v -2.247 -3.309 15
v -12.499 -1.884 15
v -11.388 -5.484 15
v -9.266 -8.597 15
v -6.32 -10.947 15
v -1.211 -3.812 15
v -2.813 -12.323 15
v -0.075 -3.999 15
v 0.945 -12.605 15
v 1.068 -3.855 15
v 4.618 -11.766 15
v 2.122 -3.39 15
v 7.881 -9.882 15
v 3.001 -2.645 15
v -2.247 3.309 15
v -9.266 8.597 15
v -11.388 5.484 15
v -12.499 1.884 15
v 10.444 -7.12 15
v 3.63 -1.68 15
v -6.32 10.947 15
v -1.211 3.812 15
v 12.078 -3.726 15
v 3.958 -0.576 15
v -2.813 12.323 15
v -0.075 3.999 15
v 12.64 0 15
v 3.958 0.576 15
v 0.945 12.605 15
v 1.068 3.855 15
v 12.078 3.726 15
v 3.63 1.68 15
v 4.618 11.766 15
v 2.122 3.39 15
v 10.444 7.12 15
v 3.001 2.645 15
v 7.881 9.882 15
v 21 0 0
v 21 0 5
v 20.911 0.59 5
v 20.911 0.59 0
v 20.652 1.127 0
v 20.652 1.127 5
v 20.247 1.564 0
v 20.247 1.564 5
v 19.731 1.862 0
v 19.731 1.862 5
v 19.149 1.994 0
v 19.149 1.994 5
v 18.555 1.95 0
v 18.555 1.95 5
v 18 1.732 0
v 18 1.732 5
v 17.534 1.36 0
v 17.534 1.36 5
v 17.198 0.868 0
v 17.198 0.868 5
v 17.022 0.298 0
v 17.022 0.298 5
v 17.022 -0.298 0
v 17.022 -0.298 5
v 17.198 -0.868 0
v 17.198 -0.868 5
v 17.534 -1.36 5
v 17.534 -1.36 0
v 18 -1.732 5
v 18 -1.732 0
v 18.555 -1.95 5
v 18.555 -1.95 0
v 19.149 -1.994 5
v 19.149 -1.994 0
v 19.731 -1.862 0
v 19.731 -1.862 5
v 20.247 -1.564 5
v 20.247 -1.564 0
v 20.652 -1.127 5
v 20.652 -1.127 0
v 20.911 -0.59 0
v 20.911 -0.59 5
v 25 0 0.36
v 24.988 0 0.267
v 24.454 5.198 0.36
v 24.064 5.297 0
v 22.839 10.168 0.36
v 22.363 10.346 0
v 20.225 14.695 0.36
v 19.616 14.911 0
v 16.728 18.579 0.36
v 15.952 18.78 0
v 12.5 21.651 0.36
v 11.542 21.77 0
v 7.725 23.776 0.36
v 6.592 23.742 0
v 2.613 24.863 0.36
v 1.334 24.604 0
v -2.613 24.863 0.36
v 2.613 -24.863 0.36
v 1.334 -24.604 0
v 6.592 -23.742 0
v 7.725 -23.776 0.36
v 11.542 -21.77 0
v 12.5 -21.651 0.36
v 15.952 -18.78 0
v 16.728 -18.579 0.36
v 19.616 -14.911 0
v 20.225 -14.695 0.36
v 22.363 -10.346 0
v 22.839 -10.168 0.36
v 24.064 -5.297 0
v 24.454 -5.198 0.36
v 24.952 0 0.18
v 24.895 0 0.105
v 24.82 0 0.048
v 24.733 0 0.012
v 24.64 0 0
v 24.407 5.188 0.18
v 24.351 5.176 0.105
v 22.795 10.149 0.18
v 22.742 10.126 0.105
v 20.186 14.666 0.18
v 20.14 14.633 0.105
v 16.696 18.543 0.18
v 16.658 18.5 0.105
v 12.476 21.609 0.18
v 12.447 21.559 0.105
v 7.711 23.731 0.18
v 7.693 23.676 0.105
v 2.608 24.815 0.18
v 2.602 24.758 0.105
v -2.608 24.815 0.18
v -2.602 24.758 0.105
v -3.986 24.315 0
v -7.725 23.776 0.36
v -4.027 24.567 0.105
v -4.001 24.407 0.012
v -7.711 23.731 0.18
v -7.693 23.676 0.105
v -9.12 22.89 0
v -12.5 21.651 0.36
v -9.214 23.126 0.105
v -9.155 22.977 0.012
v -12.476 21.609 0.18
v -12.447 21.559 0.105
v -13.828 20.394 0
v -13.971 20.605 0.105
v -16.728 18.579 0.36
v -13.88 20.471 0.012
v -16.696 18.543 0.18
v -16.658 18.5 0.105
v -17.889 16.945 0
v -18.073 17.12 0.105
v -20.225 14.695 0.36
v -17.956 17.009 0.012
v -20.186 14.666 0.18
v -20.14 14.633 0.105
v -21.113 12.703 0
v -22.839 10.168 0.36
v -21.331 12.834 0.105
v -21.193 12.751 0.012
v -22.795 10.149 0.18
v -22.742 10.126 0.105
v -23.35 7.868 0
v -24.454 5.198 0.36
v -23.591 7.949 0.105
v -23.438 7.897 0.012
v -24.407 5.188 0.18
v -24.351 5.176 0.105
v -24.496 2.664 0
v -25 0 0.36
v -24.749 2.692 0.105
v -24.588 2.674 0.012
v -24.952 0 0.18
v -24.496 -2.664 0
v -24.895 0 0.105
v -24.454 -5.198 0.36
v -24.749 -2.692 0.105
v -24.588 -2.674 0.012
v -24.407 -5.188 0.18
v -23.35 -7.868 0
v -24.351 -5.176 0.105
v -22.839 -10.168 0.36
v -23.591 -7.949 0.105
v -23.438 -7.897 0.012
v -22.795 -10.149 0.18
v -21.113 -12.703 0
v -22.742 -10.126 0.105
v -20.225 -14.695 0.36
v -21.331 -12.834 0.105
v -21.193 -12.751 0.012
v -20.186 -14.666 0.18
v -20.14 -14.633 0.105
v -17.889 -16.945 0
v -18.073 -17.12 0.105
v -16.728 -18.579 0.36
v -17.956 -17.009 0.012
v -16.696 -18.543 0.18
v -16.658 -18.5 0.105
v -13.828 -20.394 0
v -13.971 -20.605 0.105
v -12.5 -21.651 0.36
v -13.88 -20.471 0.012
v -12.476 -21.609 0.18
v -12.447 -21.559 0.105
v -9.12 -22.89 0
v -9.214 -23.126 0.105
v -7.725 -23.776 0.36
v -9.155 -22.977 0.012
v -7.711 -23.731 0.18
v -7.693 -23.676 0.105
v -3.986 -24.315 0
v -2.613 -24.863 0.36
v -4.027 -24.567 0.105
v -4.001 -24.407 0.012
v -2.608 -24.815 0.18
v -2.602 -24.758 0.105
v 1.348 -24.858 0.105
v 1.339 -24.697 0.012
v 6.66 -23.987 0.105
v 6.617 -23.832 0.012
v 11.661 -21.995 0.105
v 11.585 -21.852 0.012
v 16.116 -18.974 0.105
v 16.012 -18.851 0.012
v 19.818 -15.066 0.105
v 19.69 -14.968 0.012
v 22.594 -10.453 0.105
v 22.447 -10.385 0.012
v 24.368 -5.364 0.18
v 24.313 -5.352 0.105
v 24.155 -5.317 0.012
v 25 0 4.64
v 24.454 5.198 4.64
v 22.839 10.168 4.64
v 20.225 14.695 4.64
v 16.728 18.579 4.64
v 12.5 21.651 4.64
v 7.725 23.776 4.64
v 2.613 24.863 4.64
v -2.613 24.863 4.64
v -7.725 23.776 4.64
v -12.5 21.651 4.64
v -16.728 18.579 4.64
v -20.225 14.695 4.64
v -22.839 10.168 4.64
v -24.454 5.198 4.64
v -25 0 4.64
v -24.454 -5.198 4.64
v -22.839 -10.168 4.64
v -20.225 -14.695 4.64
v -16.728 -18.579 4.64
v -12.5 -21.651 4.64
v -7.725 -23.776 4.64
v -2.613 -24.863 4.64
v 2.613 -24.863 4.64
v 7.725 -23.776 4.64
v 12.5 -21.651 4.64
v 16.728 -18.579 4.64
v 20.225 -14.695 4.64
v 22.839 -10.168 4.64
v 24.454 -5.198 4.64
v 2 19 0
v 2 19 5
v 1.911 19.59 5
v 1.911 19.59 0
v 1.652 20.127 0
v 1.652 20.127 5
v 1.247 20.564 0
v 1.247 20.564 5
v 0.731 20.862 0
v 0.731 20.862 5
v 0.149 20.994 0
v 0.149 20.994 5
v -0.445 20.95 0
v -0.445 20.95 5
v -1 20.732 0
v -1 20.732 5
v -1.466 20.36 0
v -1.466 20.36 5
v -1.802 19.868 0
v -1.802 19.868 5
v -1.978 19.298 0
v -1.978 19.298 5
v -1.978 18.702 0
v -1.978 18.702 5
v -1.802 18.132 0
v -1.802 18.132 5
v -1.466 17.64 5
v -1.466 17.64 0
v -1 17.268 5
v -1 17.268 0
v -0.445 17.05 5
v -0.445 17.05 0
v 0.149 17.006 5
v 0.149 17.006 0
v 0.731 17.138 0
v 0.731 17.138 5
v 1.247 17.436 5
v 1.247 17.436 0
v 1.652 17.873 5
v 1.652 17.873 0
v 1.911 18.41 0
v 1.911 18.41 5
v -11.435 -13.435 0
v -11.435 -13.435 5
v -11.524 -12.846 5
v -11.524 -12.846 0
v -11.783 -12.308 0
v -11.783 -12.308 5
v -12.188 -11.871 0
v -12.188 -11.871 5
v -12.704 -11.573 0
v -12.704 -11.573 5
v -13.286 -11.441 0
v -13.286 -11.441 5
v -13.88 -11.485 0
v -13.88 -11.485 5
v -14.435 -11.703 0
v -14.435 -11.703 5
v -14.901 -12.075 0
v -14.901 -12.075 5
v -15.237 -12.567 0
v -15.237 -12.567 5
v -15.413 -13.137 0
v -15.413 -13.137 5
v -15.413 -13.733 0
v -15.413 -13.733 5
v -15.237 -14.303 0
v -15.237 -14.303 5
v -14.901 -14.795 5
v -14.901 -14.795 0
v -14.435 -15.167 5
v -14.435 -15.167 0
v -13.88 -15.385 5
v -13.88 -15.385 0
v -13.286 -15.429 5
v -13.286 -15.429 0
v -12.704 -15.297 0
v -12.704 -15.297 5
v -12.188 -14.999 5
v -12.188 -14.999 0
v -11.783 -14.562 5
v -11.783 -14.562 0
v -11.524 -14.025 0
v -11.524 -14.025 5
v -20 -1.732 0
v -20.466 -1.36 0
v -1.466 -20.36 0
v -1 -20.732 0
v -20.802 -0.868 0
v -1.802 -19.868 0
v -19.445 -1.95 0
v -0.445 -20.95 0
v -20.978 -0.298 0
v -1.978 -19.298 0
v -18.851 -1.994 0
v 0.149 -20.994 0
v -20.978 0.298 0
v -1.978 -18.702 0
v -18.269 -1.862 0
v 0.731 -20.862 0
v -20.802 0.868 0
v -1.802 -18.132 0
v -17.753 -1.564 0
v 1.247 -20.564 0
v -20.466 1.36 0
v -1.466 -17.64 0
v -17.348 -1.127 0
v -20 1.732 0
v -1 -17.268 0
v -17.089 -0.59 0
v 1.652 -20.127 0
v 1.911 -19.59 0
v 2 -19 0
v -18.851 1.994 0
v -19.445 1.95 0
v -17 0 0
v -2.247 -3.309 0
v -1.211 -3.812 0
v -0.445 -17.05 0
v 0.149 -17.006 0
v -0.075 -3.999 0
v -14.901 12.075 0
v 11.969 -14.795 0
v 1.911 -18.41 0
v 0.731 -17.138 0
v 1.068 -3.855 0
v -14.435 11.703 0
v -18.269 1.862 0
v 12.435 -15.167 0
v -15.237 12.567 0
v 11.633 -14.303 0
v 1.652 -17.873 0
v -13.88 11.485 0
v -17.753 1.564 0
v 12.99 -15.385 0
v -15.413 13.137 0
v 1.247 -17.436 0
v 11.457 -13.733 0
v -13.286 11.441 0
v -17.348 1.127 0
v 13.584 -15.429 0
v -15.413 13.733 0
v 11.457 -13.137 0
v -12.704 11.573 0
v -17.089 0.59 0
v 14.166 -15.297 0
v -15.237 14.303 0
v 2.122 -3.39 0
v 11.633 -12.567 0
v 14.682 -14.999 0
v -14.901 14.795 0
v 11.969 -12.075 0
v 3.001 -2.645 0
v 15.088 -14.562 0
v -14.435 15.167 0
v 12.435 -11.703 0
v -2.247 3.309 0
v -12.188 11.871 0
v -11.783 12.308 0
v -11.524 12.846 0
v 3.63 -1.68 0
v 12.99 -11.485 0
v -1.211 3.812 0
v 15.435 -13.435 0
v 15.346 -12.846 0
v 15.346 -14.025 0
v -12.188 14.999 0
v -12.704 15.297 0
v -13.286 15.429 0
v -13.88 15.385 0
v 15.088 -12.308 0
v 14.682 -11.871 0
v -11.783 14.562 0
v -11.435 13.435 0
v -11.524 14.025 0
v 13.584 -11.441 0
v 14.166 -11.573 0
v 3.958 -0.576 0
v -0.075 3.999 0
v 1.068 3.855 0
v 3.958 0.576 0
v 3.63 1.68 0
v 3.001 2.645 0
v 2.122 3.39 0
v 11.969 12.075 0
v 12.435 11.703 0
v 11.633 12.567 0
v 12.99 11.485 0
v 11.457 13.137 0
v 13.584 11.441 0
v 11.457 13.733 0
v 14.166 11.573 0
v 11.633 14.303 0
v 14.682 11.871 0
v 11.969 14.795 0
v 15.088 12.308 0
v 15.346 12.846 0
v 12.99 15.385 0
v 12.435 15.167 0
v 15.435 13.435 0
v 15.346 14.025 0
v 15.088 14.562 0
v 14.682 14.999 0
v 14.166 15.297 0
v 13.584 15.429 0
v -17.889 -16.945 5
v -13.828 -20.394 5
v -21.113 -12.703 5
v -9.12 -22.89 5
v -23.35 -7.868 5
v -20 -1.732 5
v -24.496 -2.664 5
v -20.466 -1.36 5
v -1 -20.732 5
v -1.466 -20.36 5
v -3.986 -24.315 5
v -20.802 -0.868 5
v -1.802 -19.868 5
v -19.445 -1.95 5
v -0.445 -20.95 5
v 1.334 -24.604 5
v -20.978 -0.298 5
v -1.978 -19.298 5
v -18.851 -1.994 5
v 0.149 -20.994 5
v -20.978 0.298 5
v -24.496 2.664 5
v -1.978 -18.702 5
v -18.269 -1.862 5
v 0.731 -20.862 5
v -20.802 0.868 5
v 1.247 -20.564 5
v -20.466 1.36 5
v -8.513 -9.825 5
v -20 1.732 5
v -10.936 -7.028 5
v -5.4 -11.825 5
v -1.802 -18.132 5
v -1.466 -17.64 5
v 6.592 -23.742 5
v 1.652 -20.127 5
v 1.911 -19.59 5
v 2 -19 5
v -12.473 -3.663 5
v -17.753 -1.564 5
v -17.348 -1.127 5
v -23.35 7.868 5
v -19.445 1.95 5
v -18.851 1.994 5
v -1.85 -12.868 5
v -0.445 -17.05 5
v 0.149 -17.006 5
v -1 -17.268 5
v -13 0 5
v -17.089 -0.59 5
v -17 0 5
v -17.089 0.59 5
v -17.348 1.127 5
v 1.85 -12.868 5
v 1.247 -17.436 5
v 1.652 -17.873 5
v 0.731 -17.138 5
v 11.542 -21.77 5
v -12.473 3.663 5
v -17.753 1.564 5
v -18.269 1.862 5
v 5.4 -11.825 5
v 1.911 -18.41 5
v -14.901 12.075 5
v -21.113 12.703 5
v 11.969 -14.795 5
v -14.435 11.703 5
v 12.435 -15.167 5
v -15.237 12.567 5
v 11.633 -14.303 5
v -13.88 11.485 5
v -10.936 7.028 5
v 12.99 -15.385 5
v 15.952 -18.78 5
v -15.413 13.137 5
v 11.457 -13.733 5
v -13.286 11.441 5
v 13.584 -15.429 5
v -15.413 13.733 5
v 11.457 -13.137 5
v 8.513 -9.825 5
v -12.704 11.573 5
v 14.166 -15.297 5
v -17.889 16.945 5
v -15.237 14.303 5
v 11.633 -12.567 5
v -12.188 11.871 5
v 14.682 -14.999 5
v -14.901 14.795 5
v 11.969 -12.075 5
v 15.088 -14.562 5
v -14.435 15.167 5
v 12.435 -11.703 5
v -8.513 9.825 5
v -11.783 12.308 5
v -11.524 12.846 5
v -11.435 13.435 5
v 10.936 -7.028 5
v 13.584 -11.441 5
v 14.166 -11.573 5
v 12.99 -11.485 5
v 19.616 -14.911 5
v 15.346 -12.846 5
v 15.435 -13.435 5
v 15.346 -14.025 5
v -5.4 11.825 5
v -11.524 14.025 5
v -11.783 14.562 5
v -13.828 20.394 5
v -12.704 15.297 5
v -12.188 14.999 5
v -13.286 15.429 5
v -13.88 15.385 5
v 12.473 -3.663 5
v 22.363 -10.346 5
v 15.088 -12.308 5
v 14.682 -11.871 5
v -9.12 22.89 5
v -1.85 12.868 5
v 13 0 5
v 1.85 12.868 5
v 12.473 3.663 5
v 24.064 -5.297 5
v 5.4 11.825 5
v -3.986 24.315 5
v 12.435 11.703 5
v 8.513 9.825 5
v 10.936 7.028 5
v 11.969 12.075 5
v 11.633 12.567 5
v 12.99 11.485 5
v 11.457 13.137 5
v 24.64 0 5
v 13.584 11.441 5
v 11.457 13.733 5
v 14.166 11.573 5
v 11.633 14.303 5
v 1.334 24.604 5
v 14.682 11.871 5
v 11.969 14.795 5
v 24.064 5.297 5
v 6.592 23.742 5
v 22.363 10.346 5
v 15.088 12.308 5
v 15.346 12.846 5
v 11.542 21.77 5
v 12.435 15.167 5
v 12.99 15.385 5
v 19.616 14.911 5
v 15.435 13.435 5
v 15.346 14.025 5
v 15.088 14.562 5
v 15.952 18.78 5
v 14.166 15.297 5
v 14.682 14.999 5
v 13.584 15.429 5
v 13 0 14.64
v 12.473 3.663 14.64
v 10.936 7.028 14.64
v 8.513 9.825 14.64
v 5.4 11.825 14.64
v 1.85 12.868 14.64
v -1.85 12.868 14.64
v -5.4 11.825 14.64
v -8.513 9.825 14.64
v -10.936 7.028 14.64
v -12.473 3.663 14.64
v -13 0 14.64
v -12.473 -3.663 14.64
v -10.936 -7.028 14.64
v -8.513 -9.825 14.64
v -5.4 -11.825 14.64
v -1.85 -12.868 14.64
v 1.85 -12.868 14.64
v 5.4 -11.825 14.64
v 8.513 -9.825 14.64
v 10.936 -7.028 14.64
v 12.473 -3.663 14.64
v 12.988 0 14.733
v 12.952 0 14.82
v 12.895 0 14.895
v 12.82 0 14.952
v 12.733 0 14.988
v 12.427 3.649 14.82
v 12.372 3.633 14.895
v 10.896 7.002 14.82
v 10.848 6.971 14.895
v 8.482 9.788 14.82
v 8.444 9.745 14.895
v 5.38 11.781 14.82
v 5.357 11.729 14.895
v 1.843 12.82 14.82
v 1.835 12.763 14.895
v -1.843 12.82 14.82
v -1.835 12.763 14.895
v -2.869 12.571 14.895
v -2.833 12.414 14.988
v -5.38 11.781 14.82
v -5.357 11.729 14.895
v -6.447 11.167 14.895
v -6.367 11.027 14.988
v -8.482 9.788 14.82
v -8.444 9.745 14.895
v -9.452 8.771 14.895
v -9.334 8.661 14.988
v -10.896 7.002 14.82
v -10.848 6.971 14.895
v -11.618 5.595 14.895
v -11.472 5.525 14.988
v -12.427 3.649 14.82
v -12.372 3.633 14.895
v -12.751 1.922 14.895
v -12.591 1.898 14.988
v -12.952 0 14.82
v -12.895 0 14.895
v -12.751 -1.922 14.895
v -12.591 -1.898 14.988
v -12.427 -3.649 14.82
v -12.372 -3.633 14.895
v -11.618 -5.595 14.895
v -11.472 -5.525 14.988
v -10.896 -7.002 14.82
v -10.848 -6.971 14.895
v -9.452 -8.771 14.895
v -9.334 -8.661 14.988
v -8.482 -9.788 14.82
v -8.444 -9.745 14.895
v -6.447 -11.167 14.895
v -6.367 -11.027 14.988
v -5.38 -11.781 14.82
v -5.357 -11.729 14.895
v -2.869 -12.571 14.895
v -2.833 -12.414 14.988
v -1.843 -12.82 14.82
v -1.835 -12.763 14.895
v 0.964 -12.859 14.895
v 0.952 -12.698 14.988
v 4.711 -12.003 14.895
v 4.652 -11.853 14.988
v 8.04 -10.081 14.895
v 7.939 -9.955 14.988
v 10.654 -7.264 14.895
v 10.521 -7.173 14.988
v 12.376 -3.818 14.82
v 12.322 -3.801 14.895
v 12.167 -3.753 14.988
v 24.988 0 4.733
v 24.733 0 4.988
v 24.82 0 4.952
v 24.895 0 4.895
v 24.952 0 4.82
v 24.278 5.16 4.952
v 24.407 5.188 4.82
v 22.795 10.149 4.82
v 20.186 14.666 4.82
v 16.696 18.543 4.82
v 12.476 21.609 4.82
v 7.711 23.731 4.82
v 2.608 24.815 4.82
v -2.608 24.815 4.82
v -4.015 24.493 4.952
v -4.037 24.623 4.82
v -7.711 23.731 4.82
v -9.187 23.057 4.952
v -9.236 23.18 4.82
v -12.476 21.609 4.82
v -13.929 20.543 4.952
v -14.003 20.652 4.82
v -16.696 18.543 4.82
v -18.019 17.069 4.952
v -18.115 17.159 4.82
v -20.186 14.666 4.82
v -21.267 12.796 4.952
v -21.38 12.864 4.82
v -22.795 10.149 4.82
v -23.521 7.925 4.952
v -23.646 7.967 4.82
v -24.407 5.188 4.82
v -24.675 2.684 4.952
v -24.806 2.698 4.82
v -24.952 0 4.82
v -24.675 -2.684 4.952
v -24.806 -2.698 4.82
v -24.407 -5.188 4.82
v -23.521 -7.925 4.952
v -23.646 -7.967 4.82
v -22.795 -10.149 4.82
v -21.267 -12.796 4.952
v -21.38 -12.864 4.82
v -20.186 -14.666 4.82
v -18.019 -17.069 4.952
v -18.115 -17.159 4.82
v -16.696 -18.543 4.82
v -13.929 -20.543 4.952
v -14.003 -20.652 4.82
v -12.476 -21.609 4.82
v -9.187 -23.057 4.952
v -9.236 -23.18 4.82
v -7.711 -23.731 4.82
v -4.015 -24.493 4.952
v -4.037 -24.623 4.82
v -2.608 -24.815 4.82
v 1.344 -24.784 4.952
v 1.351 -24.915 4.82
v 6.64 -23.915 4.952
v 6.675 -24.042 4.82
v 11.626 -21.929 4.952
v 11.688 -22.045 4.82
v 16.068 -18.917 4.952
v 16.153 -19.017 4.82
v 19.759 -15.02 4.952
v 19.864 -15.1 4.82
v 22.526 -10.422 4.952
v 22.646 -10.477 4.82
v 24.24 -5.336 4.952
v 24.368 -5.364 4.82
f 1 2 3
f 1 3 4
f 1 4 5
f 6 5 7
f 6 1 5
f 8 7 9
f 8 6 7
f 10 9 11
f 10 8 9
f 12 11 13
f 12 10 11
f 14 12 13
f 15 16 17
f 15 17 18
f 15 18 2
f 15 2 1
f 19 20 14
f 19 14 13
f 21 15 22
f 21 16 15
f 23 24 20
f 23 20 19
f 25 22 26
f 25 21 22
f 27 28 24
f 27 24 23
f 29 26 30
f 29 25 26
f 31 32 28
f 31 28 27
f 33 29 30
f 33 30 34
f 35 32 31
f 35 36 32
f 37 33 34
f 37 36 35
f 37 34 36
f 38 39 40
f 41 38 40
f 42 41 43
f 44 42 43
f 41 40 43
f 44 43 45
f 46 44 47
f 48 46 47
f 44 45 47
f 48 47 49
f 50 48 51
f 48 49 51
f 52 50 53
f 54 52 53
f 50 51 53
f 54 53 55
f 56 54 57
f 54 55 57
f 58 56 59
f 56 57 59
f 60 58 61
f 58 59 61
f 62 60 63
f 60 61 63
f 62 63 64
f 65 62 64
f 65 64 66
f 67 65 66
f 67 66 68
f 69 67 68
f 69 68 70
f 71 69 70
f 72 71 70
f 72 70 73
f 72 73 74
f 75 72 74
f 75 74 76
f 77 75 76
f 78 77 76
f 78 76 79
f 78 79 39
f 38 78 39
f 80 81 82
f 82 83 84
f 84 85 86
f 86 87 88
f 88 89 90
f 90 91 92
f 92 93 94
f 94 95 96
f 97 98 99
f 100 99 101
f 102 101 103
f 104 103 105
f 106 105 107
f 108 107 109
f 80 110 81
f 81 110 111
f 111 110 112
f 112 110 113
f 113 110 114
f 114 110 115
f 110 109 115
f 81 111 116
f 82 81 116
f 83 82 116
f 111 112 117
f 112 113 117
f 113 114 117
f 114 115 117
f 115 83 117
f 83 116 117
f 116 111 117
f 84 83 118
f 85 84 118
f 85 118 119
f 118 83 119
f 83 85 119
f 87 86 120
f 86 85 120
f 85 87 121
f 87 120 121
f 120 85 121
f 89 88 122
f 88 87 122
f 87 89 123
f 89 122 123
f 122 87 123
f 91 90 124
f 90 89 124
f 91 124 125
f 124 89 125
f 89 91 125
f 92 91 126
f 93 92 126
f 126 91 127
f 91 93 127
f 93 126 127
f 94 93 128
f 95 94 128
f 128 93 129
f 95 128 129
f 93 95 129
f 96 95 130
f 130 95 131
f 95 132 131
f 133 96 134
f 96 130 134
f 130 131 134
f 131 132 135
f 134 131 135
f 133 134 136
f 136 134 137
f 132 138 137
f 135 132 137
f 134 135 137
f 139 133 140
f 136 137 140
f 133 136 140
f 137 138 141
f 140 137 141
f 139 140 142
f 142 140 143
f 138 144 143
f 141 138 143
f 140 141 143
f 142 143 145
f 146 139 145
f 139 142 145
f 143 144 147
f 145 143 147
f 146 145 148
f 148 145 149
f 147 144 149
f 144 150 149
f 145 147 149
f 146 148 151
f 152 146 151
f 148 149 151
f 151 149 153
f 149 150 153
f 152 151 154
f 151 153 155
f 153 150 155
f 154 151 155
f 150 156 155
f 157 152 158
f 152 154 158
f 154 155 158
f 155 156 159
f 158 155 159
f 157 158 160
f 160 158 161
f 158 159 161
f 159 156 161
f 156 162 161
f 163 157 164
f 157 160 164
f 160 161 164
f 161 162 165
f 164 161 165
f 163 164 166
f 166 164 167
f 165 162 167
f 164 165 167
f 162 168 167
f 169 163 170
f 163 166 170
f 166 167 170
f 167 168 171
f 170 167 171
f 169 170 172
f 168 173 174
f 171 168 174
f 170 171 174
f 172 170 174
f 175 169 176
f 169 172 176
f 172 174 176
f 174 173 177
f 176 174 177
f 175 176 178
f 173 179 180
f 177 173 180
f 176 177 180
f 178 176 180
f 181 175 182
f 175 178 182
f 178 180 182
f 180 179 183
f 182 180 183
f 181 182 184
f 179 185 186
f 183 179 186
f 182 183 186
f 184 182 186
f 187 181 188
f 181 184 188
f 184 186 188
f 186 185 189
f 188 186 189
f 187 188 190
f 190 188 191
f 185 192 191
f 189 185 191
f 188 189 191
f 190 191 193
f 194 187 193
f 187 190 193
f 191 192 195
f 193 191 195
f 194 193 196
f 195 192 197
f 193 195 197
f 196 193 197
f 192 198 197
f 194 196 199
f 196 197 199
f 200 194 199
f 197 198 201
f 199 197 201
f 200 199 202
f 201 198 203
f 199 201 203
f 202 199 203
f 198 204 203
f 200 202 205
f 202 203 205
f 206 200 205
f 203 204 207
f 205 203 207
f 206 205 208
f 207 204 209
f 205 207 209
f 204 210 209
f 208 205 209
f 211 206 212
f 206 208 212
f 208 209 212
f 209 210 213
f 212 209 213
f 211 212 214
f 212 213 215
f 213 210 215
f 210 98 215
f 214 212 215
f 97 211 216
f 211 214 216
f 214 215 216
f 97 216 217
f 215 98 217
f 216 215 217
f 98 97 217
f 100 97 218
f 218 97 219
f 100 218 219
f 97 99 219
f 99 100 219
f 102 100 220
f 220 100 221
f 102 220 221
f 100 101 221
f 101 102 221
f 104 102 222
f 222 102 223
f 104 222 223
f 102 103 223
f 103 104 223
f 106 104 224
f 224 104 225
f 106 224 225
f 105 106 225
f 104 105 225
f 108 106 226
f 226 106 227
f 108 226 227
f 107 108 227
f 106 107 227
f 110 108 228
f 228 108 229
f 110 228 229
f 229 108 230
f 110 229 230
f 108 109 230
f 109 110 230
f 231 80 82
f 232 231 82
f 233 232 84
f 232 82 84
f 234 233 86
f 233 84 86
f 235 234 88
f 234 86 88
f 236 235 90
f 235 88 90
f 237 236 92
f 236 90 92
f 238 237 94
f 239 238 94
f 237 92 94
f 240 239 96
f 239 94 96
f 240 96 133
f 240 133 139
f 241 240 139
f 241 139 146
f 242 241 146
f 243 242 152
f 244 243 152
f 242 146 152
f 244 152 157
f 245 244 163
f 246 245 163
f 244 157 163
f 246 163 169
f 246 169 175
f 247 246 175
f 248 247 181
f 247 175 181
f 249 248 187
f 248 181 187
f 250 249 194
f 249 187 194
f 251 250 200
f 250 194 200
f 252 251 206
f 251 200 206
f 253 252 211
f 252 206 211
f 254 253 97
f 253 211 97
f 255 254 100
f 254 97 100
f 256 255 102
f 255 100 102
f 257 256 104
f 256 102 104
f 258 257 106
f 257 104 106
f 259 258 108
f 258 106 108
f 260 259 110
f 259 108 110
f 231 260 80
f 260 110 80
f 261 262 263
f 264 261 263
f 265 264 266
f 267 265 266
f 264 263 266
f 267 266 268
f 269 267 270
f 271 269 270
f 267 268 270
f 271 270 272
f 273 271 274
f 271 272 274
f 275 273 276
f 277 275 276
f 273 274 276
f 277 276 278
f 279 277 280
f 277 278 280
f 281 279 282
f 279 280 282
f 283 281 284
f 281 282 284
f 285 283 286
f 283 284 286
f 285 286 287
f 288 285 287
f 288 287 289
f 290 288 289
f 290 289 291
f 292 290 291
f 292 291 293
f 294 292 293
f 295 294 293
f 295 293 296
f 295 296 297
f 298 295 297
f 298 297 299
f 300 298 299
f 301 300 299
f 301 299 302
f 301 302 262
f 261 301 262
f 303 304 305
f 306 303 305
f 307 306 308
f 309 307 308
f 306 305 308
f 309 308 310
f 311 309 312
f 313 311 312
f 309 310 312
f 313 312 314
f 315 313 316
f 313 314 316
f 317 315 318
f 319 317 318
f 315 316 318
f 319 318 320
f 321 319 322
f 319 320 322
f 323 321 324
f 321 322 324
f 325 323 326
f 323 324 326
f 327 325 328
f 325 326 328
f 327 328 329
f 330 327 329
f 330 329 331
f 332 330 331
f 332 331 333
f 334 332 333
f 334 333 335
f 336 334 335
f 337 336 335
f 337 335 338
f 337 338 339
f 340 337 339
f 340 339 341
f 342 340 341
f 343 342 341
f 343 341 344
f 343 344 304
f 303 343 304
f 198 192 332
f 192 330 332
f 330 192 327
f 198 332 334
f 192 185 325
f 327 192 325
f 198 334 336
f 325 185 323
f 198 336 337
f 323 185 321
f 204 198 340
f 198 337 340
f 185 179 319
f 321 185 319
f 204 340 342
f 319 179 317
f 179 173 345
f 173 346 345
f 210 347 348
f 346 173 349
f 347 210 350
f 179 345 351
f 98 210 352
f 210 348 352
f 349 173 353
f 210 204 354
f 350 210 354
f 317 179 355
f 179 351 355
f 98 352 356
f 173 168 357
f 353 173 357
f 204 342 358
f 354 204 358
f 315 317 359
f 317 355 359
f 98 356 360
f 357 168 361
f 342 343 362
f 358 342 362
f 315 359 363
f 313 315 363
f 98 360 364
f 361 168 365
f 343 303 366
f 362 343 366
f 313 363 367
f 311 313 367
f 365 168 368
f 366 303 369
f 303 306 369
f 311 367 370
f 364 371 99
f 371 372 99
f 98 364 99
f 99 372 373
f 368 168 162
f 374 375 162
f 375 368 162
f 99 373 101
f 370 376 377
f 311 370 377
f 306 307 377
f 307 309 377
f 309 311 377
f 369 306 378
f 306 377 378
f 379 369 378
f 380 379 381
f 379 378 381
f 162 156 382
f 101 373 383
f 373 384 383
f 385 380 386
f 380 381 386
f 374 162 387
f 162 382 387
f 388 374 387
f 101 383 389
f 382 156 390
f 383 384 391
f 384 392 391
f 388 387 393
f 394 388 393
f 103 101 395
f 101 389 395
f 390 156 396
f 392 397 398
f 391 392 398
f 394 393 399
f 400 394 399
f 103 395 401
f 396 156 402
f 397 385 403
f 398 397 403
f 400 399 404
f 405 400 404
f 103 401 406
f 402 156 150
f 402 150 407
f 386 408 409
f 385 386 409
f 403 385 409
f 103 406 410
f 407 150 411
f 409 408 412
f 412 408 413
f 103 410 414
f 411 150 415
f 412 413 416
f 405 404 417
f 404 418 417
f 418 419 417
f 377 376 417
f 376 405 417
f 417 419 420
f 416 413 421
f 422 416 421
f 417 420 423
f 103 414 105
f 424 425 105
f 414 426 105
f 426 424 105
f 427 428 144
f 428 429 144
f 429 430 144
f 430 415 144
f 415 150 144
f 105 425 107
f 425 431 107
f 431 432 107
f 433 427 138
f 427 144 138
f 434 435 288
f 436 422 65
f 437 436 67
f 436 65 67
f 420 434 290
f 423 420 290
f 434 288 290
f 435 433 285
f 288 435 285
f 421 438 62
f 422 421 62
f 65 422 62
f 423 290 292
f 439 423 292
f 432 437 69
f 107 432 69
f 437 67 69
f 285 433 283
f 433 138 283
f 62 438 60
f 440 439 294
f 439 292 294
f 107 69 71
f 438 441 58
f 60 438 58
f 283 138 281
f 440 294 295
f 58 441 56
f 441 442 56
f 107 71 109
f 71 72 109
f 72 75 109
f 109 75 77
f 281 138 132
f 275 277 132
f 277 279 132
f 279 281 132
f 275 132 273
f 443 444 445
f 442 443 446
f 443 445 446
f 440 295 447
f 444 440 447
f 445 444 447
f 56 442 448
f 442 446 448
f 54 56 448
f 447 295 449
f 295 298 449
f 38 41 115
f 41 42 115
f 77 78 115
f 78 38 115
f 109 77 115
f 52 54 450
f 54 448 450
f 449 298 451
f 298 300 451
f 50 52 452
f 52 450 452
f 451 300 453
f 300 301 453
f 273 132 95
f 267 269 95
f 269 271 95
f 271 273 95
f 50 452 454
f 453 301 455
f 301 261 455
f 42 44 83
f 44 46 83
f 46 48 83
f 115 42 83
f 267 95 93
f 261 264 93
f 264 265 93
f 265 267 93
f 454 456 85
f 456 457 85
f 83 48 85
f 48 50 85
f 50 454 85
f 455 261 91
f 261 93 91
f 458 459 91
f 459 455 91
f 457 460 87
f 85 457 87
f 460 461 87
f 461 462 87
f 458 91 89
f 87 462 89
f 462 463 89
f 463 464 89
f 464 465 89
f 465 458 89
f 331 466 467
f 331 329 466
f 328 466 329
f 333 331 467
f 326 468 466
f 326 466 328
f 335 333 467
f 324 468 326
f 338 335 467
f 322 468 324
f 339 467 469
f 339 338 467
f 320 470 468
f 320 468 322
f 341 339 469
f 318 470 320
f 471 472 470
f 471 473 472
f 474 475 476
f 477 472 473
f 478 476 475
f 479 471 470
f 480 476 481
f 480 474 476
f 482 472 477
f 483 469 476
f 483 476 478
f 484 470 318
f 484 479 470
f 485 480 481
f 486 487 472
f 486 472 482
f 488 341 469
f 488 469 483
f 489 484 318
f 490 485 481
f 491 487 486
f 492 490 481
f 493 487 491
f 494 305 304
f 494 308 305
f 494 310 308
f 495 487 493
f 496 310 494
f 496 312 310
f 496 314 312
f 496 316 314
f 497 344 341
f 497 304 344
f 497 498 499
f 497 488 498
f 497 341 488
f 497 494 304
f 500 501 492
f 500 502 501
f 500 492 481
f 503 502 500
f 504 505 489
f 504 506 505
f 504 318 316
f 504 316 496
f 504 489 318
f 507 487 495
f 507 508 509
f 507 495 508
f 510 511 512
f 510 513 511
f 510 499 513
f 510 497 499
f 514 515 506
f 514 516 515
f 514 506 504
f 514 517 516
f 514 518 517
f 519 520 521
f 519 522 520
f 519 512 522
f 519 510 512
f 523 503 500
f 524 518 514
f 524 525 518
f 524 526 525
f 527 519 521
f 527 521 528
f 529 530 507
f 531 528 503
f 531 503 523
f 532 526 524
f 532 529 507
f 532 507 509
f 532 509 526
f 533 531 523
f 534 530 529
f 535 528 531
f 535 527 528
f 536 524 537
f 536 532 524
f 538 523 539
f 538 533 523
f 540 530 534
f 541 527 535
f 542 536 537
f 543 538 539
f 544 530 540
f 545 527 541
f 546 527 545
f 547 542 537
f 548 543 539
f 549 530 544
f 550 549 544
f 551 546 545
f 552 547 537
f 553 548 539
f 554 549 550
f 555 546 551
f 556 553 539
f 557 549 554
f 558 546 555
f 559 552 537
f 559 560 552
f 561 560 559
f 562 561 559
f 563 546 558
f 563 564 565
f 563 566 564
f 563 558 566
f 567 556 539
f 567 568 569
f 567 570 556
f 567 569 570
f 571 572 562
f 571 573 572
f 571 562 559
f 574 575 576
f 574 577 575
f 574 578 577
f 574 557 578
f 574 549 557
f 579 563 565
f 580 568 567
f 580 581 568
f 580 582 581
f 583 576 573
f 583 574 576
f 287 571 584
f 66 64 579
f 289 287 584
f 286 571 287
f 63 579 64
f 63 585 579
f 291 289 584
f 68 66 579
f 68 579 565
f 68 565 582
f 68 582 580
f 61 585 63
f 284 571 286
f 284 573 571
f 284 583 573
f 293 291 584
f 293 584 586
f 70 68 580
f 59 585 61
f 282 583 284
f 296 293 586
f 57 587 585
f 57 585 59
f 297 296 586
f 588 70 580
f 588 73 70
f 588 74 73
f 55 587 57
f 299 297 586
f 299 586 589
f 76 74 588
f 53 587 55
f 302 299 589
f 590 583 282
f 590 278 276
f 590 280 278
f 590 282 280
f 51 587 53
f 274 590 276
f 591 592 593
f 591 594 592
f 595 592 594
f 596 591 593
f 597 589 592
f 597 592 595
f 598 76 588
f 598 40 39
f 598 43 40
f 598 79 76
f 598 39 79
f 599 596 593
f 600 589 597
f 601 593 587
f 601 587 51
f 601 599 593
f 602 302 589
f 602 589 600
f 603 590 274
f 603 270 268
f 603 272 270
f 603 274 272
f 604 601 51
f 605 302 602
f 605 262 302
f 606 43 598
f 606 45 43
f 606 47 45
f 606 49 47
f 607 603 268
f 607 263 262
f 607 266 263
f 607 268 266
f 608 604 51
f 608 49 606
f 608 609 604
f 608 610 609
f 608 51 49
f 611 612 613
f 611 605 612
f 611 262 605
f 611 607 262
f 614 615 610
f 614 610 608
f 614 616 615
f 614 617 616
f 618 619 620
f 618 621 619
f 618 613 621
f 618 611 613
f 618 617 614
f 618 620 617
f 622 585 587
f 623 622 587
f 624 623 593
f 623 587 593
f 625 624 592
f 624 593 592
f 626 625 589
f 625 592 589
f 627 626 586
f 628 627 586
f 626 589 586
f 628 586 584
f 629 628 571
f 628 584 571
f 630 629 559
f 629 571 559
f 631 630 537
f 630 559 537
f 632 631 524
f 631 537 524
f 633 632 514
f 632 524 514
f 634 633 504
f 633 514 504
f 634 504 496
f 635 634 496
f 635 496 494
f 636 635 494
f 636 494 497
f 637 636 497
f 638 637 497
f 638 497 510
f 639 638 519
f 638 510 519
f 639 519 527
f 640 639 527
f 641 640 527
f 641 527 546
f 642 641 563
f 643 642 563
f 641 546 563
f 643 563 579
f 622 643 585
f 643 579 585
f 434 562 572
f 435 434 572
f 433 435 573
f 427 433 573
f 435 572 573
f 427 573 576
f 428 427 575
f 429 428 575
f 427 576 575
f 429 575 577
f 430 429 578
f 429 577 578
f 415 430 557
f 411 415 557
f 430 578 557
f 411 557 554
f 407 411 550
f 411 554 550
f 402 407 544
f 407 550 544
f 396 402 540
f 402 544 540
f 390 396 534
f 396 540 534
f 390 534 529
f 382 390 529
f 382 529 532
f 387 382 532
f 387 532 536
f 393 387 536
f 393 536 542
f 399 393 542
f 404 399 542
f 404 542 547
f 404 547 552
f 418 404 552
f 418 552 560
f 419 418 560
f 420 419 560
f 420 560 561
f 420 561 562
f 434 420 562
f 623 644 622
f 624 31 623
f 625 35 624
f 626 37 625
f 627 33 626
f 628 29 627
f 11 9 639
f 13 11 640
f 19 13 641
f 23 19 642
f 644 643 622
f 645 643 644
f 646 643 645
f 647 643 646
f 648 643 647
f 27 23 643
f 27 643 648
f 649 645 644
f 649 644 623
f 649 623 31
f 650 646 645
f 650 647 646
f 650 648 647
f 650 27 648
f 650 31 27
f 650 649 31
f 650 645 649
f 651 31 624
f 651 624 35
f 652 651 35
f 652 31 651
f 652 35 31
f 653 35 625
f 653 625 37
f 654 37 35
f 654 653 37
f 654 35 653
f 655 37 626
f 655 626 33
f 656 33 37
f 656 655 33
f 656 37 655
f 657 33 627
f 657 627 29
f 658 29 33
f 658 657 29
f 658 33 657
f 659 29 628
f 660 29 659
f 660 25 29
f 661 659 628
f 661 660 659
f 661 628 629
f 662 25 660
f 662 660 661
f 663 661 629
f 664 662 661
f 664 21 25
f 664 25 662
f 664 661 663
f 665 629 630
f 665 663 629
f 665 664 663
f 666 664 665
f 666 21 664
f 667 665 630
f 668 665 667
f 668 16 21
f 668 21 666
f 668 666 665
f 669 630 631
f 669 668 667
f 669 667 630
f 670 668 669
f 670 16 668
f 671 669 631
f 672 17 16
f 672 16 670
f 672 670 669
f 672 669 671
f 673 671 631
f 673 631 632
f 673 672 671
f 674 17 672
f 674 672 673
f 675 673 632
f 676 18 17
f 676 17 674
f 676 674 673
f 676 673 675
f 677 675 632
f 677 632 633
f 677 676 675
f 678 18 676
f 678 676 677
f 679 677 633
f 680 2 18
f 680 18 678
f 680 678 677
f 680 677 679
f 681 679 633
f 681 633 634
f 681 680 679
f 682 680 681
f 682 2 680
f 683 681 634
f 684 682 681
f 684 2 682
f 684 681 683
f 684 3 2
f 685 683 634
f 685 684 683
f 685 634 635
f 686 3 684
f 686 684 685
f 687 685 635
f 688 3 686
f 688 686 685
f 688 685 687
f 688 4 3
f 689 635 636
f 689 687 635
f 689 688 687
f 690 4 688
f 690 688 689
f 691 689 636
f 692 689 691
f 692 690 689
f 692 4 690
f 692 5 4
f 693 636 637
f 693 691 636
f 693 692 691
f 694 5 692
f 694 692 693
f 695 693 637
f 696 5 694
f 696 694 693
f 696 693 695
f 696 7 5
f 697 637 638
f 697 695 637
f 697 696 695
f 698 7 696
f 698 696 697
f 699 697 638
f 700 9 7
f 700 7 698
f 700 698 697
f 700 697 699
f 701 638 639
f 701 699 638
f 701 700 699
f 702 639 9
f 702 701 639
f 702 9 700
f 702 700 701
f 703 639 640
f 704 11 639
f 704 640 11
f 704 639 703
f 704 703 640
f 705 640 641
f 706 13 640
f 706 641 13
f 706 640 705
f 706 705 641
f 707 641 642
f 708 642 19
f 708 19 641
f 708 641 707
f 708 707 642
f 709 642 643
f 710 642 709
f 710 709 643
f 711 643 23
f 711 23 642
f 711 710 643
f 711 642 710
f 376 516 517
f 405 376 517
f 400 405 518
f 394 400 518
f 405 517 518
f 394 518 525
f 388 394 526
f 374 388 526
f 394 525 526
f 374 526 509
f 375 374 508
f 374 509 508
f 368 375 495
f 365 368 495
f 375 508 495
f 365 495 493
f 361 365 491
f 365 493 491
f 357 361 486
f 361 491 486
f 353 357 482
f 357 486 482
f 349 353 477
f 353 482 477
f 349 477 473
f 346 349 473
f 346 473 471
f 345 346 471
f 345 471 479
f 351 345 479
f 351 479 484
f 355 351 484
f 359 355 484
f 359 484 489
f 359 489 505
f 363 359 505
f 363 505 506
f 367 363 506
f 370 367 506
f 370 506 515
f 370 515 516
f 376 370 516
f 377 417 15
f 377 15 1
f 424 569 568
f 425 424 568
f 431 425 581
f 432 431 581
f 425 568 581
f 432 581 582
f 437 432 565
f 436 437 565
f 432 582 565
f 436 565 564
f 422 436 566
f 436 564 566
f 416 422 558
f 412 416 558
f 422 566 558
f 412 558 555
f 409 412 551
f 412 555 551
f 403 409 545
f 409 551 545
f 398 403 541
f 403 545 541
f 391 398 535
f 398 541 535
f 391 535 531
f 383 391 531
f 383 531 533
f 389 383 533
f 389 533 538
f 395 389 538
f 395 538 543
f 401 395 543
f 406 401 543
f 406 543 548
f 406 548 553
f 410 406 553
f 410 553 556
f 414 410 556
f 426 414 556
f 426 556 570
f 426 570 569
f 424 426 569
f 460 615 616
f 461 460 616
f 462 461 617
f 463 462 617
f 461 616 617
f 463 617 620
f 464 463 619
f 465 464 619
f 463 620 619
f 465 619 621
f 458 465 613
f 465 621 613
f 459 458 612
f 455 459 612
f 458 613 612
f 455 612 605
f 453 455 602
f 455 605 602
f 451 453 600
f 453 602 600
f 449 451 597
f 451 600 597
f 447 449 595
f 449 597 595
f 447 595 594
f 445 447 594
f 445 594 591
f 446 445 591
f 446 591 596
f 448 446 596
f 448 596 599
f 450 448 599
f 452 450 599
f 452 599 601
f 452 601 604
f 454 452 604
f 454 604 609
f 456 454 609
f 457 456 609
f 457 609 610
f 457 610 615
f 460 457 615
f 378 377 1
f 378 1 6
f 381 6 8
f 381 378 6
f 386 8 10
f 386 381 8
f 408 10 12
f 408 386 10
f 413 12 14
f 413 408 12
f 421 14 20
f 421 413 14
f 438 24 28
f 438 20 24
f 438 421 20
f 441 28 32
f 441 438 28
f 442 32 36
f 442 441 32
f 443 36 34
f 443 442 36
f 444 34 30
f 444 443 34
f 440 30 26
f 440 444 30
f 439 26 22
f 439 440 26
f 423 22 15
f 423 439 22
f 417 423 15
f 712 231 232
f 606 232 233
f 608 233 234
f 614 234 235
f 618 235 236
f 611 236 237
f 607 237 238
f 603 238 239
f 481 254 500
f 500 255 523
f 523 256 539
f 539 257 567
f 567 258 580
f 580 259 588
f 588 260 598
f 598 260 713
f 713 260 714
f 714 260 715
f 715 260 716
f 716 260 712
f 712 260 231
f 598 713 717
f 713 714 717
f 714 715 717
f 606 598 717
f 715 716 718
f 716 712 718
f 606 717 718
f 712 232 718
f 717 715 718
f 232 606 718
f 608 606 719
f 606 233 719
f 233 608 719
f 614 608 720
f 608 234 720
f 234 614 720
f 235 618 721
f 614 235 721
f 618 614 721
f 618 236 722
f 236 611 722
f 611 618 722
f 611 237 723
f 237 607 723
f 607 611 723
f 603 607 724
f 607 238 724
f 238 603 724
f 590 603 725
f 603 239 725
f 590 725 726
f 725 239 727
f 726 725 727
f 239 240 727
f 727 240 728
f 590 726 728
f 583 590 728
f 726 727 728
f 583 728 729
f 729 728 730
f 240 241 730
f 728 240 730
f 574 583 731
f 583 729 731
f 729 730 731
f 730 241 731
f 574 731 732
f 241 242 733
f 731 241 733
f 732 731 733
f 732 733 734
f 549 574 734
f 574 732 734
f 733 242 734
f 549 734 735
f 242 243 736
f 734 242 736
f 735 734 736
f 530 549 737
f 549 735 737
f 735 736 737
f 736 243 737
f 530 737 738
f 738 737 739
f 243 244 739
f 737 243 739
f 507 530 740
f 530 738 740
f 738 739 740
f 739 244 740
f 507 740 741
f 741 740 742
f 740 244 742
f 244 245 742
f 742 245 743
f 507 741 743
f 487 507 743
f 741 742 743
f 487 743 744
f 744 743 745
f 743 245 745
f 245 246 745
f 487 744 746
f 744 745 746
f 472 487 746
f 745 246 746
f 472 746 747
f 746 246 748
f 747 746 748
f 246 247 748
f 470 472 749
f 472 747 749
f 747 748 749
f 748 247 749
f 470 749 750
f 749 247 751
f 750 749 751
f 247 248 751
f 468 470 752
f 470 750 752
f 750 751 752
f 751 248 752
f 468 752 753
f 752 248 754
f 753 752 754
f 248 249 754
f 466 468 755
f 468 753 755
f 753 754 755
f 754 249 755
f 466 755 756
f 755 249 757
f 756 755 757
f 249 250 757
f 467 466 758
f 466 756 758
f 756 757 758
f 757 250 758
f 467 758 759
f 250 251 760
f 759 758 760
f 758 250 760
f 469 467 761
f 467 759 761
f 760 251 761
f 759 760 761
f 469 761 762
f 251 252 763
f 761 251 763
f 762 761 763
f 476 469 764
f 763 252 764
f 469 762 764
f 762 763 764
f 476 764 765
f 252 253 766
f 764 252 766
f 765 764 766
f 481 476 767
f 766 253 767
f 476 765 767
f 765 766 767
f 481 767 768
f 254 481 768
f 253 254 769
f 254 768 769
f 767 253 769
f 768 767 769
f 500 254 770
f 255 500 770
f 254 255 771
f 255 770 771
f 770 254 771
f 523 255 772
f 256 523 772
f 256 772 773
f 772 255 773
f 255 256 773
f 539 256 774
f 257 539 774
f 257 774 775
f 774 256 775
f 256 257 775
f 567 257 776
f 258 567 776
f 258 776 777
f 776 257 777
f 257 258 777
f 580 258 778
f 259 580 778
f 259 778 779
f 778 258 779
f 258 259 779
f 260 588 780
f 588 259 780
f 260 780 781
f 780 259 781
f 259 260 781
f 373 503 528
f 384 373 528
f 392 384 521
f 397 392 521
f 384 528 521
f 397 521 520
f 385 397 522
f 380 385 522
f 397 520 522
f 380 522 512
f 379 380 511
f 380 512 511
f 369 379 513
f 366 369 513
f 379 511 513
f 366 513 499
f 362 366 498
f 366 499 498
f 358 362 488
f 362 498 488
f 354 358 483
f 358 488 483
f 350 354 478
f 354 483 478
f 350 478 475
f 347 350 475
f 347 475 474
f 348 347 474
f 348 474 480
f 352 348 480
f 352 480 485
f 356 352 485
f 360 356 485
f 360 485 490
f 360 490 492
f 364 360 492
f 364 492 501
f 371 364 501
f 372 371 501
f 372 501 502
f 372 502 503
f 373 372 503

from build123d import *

# Parameters (mm, degrees)
SKETCH_1_R          = 25
SKETCH_1_R_2        = 4
EXTRUDE_1_DEPTH     = 5
EXTRUDE_2_DEPTH     = 5
SKETCH_5_R          = 13
EXTRUDE_3_DEPTH     = 10
CUT_EXTRUDE_1_DEPTH = 18
SKETCH_7_R          = 2
CUT_EXTRUDE_2_DEPTH = 18
FILLET_4_R          = 0.36


with BuildPart() as part:
    # 草图1 → 凸台-拉伸1 (new body)
    with BuildSketch(Plane.XY):
        Circle(SKETCH_1_R)
        Circle(SKETCH_1_R_2, mode=Mode.SUBTRACT)
    extrude(amount=EXTRUDE_1_DEPTH)

    # 草图2 → 凸台-拉伸2 (add)
    with BuildSketch(Plane.XY.offset(5)):
        with BuildLine():
            Line((-2.247476495, -3.308904563), (-2.247476495, 3.308904563))
            ThreePointArc((-2.247476495, 3.308904563), (-4, 0), (-2.247476495, -3.308904563))
        make_face()
    extrude(amount=-EXTRUDE_2_DEPTH)

    # 草图5 → 凸台-拉伸3 (add)
    with BuildSketch(Plane.XY.offset(5)):
        Circle(SKETCH_5_R)
    extrude(amount=EXTRUDE_3_DEPTH)

    # 草图6 → 切除-拉伸1 (cut)
    with BuildSketch(Plane(origin=(0, 0, 0), x_dir=(-1, 0, 0), z_dir=(0, 0, -1))):
        with BuildLine():
            Line((2.247476495, 3.308904563), (2.247476495, -3.308904563))
            ThreePointArc((2.247476495, -3.308904563), (-4, 0), (2.247476495, 3.308904563))
        make_face()
    extrude(amount=-CUT_EXTRUDE_1_DEPTH, mode=Mode.SUBTRACT)

    # 草图7 → 切除-拉伸2 (cut)
    with BuildSketch(Plane.XY.offset(5)):
        with Locations((0, 19)):
            Circle(SKETCH_7_R)
        with Locations((13.435028843, 13.435028843)):
            Circle(SKETCH_7_R)
        with Locations((19, 0)):
            Circle(SKETCH_7_R)
        with Locations((13.435028843, -13.435028843)):
            Circle(SKETCH_7_R)
        with Locations((0, -19)):
            Circle(SKETCH_7_R)
        with Locations((-13.435028843, -13.435028843)):
            Circle(SKETCH_7_R)
        with Locations((-19, 0)):
            Circle(SKETCH_7_R)
        with Locations((-13.435028843, 13.435028843)):
            Circle(SKETCH_7_R)
    extrude(amount=-CUT_EXTRUDE_2_DEPTH, mode=Mode.SUBTRACT)

    # 圆角4
    fillet_4_edges = [part.edges().sort_by_distance(p)[0] for p in [
        (-25, 0, 0),
        (-13, 0, 15),
        (-25, 0, 5),
    ]]
    fillet(fillet_4_edges, radius=FILLET_4_R)


solid = part.part
